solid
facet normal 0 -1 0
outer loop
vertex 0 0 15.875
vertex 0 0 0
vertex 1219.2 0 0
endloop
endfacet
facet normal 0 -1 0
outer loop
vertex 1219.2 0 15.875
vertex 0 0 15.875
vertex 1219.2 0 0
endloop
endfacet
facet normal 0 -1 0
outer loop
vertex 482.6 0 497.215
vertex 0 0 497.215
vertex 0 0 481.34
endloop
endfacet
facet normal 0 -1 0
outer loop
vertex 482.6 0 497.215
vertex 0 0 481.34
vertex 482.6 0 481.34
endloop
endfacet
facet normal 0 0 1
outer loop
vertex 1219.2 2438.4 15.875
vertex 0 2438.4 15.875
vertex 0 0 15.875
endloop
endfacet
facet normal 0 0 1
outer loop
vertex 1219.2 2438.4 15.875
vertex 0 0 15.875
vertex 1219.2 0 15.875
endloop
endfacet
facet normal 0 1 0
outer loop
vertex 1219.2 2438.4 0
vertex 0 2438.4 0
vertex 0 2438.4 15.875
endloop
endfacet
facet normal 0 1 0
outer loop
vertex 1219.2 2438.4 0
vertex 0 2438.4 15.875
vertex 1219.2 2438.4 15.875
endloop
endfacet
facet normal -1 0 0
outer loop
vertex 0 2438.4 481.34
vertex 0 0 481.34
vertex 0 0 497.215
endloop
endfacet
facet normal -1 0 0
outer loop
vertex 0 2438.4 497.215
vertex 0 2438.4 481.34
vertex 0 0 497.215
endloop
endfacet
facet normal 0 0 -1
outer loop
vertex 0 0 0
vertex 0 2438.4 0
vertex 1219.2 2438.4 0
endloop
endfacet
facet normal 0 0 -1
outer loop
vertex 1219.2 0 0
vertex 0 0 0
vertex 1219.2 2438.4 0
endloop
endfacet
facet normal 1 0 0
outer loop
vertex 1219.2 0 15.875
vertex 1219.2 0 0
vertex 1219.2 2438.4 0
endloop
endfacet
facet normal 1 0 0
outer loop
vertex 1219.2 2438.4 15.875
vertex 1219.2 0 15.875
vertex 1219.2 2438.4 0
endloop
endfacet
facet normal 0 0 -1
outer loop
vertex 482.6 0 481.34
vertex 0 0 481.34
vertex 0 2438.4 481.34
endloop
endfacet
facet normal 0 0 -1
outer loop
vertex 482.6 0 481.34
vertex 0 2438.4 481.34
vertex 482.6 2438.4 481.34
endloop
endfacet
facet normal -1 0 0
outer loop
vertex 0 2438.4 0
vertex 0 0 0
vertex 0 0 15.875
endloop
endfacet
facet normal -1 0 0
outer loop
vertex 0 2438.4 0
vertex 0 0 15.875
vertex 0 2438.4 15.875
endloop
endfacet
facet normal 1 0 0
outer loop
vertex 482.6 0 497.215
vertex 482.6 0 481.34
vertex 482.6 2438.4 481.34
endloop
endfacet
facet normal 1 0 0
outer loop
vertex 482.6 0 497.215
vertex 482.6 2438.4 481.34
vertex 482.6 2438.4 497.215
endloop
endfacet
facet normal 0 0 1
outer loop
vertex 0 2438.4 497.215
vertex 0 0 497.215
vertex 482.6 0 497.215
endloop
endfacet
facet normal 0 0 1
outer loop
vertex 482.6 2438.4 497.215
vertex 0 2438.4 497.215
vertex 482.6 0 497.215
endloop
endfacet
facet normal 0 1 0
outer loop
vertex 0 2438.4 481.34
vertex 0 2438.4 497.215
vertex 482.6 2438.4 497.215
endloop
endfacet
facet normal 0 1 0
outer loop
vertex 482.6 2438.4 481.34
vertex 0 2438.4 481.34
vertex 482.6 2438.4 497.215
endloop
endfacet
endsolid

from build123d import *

# Parameters (mm, degrees)
F0_W     = 1219.2
F0_H     = 2438.4
F1_DEPTH = 15.875
F2_W     = 482.6
F2_H     = 15.875
F3_DEPTH = 2438.4


with BuildPart() as f1:
    # F0 (on Top) → F1 (new body)
    with BuildSketch(Plane.XY):
        with Locations((609.6, 1219.2)):
            Rectangle(F0_W, F0_H)
    extrude(amount=F1_DEPTH)


with BuildPart() as f3:
    # F2 (on Front) → F3 (new body)
    with BuildSketch(Plane.XZ):
        with Locations((241.3, 489.277104)):
            Rectangle(F2_W, F2_H)
    extrude(amount=-F3_DEPTH)


solid = Compound([f1.part, f3.part])
